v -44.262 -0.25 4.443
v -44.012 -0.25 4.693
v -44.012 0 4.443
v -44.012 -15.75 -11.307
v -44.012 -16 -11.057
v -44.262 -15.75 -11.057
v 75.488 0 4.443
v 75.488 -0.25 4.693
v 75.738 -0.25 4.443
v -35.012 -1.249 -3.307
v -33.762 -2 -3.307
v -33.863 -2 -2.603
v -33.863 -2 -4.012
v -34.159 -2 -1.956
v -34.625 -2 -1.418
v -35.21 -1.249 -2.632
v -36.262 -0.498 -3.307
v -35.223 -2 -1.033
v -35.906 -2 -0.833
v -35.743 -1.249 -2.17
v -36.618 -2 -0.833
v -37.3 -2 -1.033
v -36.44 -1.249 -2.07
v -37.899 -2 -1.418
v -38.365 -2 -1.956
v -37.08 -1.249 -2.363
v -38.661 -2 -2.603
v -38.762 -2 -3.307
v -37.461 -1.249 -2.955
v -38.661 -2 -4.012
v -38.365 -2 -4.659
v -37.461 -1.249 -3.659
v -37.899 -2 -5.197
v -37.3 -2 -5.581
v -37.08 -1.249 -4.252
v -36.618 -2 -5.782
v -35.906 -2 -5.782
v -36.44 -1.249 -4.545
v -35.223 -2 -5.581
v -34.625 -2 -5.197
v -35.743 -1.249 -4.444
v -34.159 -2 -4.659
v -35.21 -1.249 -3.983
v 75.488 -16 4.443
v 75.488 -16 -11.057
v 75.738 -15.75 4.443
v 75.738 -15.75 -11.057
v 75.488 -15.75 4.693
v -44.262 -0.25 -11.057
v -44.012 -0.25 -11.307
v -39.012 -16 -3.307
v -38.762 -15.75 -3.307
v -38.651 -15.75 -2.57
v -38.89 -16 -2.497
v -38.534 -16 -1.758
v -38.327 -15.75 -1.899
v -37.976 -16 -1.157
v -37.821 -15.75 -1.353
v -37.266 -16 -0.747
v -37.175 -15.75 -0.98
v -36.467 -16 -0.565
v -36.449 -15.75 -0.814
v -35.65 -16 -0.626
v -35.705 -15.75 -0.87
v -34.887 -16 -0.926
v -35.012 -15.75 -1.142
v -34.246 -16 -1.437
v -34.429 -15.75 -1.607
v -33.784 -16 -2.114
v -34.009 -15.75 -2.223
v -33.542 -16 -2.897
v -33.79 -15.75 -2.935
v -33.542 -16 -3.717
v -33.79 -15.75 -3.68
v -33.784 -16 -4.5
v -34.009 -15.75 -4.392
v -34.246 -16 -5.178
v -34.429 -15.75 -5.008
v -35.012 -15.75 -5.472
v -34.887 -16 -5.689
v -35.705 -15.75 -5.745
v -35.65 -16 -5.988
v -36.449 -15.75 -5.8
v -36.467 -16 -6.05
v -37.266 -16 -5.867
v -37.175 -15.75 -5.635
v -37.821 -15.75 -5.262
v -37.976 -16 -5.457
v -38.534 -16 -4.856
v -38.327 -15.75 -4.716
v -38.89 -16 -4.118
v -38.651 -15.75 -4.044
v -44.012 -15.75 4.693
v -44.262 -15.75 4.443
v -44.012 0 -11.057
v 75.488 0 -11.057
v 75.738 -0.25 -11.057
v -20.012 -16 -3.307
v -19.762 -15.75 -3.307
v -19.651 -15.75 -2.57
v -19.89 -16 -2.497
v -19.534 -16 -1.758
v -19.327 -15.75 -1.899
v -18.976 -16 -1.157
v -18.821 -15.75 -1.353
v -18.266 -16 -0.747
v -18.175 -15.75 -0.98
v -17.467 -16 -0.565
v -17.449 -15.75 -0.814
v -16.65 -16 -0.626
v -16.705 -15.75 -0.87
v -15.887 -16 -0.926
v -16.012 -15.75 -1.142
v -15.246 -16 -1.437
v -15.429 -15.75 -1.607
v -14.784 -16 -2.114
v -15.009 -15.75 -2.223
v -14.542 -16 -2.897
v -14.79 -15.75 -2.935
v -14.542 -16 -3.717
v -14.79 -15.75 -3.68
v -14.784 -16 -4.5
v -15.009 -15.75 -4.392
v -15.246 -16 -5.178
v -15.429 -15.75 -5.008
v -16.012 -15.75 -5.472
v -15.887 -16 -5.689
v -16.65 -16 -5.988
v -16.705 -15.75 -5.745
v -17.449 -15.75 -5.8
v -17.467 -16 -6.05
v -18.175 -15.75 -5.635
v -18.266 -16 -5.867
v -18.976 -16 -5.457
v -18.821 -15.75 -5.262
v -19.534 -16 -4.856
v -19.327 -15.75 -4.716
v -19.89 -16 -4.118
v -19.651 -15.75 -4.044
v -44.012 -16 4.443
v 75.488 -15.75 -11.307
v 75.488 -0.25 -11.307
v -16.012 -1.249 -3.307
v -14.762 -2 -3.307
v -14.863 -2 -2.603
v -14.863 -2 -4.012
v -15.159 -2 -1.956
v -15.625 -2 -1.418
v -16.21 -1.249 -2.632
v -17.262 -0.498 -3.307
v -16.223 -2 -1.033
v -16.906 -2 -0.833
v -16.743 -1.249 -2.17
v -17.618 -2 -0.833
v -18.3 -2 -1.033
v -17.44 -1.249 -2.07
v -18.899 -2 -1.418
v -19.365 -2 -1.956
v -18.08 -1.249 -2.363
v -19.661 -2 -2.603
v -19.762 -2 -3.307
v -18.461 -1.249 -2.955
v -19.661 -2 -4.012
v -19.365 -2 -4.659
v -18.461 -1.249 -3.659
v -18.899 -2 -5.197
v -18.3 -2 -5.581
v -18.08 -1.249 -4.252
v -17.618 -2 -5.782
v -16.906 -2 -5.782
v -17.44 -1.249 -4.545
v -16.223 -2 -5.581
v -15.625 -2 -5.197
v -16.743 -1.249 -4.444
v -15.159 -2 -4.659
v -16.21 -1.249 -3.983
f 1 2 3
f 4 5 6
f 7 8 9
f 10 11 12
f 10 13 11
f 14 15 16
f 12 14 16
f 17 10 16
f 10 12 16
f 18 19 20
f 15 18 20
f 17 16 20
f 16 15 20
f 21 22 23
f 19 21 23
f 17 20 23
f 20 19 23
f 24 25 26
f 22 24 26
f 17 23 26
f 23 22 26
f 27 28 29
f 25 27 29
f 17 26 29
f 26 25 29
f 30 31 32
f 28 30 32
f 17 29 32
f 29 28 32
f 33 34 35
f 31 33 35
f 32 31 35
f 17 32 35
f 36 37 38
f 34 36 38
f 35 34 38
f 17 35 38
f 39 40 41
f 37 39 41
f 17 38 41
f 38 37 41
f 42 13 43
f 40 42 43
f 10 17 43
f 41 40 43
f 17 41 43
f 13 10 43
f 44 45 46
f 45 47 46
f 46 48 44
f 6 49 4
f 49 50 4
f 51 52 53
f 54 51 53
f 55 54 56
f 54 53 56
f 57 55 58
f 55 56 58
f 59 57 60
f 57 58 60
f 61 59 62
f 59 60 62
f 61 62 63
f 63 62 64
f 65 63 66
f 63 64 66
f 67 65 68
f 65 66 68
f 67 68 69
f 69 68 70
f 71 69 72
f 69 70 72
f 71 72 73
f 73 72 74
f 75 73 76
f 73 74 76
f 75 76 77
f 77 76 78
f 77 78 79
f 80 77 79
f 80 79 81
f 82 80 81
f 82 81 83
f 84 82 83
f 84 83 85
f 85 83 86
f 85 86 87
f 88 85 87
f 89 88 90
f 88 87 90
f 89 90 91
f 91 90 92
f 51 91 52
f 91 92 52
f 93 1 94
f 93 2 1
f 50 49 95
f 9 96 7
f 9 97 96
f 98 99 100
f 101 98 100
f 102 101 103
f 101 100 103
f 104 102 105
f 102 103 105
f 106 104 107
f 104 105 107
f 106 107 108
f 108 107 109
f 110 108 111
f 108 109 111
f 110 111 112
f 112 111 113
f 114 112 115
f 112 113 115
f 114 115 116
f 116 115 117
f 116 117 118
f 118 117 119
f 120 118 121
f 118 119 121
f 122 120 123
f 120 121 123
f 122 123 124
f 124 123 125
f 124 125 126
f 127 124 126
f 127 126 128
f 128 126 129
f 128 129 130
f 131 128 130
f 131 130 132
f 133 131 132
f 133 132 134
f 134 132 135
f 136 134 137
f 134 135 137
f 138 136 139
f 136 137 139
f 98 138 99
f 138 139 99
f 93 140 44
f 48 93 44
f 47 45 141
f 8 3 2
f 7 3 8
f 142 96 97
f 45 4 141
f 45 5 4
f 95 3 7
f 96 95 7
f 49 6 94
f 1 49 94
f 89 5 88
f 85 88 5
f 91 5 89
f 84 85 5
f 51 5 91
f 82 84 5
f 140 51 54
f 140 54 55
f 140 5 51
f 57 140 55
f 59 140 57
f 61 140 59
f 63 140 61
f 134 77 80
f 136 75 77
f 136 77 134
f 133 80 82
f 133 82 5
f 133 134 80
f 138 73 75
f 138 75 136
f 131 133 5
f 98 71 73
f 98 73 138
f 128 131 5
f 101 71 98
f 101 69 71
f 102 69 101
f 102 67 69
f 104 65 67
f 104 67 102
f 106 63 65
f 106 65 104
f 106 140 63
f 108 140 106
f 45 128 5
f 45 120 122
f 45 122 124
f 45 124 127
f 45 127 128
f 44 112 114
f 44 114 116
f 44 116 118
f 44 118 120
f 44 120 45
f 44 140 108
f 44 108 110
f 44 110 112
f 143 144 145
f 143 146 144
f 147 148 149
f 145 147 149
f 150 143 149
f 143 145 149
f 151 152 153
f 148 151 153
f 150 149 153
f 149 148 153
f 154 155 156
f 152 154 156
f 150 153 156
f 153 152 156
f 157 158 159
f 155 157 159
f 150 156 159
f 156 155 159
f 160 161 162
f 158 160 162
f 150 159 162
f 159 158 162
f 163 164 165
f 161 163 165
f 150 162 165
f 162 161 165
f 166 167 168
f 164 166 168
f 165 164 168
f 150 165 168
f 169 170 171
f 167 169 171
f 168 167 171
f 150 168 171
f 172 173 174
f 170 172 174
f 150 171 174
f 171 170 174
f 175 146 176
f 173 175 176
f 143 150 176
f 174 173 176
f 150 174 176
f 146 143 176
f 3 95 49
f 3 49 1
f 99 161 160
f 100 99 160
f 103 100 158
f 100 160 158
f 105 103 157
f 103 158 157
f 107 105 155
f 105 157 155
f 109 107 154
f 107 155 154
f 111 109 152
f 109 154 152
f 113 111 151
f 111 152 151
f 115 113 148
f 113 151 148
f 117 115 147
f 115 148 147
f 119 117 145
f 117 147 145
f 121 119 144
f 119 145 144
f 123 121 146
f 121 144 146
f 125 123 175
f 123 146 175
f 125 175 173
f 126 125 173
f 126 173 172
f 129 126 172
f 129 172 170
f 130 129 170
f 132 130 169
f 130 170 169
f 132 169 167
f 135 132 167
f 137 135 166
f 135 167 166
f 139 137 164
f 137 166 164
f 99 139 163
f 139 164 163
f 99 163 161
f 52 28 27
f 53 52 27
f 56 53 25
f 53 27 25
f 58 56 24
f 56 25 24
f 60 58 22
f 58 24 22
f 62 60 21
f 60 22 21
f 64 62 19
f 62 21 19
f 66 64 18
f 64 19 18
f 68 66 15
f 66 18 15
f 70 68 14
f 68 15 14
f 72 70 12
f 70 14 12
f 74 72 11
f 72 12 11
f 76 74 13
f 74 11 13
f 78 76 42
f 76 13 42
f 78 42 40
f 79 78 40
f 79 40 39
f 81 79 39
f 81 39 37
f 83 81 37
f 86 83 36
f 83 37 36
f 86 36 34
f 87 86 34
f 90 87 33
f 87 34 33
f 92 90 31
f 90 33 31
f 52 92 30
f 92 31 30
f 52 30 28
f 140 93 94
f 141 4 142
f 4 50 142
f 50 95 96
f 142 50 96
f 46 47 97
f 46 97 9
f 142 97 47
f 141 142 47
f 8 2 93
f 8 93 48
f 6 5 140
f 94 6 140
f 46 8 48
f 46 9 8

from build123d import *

# Parameters (mm, degrees)
F0_W     = 120
F0_H     = 16
F1_DEPTH = 16
F3_D     = 5
F3_DEPTH = 14
F3_TIP   = 1.5021515476
F4_SIZE  = 0.25


with BuildPart() as f1:
    # F0 (on Front) → F1 (new body)
    with BuildSketch(Plane.XZ):
        with Locations((15.7382229716, -3.3073185302)):
            Rectangle(F0_W, F0_H)
    extrude(amount=F1_DEPTH)

    # F3
    with Locations(Plane.XZ.offset(16)):
        with Locations((-17.2617770284, -3.3073185302), (-36.2617770284, -3.3073185302)):
            Hole(F3_D / 2, depth=F3_DEPTH)
            with Locations((0, 0, -(F3_DEPTH + F3_TIP / 2))):  # 118° drill point
                Cone(0, F3_D / 2, F3_TIP, mode=Mode.SUBTRACT)

    # F4
    f4_edges = [f1.edges().sort_by_distance(p)[0] for p in [
        (75.738223, -8, 4.692681),
        (-44.261777, -8, 4.692681),
        (15.738223, 0, 4.692681),
        (15.738223, -16, 4.692681),
        (75.738223, -16, -3.307319),
        (15.738223, -16, -11.307319),
        (-44.261777, -16, -3.307319),
        (-38.761777, -16, -3.307319),
        (-19.761777, -16, -3.307319),
        (-44.261777, -8, -11.307319),
        (-44.261777, 0, -3.307319),
        (75.738223, 0, -3.307319),
        (15.738223, 0, -11.307319),
        (75.738223, -8, -11.307319),
    ]]
    chamfer(f4_edges, length=F4_SIZE)


solid = f1.part
